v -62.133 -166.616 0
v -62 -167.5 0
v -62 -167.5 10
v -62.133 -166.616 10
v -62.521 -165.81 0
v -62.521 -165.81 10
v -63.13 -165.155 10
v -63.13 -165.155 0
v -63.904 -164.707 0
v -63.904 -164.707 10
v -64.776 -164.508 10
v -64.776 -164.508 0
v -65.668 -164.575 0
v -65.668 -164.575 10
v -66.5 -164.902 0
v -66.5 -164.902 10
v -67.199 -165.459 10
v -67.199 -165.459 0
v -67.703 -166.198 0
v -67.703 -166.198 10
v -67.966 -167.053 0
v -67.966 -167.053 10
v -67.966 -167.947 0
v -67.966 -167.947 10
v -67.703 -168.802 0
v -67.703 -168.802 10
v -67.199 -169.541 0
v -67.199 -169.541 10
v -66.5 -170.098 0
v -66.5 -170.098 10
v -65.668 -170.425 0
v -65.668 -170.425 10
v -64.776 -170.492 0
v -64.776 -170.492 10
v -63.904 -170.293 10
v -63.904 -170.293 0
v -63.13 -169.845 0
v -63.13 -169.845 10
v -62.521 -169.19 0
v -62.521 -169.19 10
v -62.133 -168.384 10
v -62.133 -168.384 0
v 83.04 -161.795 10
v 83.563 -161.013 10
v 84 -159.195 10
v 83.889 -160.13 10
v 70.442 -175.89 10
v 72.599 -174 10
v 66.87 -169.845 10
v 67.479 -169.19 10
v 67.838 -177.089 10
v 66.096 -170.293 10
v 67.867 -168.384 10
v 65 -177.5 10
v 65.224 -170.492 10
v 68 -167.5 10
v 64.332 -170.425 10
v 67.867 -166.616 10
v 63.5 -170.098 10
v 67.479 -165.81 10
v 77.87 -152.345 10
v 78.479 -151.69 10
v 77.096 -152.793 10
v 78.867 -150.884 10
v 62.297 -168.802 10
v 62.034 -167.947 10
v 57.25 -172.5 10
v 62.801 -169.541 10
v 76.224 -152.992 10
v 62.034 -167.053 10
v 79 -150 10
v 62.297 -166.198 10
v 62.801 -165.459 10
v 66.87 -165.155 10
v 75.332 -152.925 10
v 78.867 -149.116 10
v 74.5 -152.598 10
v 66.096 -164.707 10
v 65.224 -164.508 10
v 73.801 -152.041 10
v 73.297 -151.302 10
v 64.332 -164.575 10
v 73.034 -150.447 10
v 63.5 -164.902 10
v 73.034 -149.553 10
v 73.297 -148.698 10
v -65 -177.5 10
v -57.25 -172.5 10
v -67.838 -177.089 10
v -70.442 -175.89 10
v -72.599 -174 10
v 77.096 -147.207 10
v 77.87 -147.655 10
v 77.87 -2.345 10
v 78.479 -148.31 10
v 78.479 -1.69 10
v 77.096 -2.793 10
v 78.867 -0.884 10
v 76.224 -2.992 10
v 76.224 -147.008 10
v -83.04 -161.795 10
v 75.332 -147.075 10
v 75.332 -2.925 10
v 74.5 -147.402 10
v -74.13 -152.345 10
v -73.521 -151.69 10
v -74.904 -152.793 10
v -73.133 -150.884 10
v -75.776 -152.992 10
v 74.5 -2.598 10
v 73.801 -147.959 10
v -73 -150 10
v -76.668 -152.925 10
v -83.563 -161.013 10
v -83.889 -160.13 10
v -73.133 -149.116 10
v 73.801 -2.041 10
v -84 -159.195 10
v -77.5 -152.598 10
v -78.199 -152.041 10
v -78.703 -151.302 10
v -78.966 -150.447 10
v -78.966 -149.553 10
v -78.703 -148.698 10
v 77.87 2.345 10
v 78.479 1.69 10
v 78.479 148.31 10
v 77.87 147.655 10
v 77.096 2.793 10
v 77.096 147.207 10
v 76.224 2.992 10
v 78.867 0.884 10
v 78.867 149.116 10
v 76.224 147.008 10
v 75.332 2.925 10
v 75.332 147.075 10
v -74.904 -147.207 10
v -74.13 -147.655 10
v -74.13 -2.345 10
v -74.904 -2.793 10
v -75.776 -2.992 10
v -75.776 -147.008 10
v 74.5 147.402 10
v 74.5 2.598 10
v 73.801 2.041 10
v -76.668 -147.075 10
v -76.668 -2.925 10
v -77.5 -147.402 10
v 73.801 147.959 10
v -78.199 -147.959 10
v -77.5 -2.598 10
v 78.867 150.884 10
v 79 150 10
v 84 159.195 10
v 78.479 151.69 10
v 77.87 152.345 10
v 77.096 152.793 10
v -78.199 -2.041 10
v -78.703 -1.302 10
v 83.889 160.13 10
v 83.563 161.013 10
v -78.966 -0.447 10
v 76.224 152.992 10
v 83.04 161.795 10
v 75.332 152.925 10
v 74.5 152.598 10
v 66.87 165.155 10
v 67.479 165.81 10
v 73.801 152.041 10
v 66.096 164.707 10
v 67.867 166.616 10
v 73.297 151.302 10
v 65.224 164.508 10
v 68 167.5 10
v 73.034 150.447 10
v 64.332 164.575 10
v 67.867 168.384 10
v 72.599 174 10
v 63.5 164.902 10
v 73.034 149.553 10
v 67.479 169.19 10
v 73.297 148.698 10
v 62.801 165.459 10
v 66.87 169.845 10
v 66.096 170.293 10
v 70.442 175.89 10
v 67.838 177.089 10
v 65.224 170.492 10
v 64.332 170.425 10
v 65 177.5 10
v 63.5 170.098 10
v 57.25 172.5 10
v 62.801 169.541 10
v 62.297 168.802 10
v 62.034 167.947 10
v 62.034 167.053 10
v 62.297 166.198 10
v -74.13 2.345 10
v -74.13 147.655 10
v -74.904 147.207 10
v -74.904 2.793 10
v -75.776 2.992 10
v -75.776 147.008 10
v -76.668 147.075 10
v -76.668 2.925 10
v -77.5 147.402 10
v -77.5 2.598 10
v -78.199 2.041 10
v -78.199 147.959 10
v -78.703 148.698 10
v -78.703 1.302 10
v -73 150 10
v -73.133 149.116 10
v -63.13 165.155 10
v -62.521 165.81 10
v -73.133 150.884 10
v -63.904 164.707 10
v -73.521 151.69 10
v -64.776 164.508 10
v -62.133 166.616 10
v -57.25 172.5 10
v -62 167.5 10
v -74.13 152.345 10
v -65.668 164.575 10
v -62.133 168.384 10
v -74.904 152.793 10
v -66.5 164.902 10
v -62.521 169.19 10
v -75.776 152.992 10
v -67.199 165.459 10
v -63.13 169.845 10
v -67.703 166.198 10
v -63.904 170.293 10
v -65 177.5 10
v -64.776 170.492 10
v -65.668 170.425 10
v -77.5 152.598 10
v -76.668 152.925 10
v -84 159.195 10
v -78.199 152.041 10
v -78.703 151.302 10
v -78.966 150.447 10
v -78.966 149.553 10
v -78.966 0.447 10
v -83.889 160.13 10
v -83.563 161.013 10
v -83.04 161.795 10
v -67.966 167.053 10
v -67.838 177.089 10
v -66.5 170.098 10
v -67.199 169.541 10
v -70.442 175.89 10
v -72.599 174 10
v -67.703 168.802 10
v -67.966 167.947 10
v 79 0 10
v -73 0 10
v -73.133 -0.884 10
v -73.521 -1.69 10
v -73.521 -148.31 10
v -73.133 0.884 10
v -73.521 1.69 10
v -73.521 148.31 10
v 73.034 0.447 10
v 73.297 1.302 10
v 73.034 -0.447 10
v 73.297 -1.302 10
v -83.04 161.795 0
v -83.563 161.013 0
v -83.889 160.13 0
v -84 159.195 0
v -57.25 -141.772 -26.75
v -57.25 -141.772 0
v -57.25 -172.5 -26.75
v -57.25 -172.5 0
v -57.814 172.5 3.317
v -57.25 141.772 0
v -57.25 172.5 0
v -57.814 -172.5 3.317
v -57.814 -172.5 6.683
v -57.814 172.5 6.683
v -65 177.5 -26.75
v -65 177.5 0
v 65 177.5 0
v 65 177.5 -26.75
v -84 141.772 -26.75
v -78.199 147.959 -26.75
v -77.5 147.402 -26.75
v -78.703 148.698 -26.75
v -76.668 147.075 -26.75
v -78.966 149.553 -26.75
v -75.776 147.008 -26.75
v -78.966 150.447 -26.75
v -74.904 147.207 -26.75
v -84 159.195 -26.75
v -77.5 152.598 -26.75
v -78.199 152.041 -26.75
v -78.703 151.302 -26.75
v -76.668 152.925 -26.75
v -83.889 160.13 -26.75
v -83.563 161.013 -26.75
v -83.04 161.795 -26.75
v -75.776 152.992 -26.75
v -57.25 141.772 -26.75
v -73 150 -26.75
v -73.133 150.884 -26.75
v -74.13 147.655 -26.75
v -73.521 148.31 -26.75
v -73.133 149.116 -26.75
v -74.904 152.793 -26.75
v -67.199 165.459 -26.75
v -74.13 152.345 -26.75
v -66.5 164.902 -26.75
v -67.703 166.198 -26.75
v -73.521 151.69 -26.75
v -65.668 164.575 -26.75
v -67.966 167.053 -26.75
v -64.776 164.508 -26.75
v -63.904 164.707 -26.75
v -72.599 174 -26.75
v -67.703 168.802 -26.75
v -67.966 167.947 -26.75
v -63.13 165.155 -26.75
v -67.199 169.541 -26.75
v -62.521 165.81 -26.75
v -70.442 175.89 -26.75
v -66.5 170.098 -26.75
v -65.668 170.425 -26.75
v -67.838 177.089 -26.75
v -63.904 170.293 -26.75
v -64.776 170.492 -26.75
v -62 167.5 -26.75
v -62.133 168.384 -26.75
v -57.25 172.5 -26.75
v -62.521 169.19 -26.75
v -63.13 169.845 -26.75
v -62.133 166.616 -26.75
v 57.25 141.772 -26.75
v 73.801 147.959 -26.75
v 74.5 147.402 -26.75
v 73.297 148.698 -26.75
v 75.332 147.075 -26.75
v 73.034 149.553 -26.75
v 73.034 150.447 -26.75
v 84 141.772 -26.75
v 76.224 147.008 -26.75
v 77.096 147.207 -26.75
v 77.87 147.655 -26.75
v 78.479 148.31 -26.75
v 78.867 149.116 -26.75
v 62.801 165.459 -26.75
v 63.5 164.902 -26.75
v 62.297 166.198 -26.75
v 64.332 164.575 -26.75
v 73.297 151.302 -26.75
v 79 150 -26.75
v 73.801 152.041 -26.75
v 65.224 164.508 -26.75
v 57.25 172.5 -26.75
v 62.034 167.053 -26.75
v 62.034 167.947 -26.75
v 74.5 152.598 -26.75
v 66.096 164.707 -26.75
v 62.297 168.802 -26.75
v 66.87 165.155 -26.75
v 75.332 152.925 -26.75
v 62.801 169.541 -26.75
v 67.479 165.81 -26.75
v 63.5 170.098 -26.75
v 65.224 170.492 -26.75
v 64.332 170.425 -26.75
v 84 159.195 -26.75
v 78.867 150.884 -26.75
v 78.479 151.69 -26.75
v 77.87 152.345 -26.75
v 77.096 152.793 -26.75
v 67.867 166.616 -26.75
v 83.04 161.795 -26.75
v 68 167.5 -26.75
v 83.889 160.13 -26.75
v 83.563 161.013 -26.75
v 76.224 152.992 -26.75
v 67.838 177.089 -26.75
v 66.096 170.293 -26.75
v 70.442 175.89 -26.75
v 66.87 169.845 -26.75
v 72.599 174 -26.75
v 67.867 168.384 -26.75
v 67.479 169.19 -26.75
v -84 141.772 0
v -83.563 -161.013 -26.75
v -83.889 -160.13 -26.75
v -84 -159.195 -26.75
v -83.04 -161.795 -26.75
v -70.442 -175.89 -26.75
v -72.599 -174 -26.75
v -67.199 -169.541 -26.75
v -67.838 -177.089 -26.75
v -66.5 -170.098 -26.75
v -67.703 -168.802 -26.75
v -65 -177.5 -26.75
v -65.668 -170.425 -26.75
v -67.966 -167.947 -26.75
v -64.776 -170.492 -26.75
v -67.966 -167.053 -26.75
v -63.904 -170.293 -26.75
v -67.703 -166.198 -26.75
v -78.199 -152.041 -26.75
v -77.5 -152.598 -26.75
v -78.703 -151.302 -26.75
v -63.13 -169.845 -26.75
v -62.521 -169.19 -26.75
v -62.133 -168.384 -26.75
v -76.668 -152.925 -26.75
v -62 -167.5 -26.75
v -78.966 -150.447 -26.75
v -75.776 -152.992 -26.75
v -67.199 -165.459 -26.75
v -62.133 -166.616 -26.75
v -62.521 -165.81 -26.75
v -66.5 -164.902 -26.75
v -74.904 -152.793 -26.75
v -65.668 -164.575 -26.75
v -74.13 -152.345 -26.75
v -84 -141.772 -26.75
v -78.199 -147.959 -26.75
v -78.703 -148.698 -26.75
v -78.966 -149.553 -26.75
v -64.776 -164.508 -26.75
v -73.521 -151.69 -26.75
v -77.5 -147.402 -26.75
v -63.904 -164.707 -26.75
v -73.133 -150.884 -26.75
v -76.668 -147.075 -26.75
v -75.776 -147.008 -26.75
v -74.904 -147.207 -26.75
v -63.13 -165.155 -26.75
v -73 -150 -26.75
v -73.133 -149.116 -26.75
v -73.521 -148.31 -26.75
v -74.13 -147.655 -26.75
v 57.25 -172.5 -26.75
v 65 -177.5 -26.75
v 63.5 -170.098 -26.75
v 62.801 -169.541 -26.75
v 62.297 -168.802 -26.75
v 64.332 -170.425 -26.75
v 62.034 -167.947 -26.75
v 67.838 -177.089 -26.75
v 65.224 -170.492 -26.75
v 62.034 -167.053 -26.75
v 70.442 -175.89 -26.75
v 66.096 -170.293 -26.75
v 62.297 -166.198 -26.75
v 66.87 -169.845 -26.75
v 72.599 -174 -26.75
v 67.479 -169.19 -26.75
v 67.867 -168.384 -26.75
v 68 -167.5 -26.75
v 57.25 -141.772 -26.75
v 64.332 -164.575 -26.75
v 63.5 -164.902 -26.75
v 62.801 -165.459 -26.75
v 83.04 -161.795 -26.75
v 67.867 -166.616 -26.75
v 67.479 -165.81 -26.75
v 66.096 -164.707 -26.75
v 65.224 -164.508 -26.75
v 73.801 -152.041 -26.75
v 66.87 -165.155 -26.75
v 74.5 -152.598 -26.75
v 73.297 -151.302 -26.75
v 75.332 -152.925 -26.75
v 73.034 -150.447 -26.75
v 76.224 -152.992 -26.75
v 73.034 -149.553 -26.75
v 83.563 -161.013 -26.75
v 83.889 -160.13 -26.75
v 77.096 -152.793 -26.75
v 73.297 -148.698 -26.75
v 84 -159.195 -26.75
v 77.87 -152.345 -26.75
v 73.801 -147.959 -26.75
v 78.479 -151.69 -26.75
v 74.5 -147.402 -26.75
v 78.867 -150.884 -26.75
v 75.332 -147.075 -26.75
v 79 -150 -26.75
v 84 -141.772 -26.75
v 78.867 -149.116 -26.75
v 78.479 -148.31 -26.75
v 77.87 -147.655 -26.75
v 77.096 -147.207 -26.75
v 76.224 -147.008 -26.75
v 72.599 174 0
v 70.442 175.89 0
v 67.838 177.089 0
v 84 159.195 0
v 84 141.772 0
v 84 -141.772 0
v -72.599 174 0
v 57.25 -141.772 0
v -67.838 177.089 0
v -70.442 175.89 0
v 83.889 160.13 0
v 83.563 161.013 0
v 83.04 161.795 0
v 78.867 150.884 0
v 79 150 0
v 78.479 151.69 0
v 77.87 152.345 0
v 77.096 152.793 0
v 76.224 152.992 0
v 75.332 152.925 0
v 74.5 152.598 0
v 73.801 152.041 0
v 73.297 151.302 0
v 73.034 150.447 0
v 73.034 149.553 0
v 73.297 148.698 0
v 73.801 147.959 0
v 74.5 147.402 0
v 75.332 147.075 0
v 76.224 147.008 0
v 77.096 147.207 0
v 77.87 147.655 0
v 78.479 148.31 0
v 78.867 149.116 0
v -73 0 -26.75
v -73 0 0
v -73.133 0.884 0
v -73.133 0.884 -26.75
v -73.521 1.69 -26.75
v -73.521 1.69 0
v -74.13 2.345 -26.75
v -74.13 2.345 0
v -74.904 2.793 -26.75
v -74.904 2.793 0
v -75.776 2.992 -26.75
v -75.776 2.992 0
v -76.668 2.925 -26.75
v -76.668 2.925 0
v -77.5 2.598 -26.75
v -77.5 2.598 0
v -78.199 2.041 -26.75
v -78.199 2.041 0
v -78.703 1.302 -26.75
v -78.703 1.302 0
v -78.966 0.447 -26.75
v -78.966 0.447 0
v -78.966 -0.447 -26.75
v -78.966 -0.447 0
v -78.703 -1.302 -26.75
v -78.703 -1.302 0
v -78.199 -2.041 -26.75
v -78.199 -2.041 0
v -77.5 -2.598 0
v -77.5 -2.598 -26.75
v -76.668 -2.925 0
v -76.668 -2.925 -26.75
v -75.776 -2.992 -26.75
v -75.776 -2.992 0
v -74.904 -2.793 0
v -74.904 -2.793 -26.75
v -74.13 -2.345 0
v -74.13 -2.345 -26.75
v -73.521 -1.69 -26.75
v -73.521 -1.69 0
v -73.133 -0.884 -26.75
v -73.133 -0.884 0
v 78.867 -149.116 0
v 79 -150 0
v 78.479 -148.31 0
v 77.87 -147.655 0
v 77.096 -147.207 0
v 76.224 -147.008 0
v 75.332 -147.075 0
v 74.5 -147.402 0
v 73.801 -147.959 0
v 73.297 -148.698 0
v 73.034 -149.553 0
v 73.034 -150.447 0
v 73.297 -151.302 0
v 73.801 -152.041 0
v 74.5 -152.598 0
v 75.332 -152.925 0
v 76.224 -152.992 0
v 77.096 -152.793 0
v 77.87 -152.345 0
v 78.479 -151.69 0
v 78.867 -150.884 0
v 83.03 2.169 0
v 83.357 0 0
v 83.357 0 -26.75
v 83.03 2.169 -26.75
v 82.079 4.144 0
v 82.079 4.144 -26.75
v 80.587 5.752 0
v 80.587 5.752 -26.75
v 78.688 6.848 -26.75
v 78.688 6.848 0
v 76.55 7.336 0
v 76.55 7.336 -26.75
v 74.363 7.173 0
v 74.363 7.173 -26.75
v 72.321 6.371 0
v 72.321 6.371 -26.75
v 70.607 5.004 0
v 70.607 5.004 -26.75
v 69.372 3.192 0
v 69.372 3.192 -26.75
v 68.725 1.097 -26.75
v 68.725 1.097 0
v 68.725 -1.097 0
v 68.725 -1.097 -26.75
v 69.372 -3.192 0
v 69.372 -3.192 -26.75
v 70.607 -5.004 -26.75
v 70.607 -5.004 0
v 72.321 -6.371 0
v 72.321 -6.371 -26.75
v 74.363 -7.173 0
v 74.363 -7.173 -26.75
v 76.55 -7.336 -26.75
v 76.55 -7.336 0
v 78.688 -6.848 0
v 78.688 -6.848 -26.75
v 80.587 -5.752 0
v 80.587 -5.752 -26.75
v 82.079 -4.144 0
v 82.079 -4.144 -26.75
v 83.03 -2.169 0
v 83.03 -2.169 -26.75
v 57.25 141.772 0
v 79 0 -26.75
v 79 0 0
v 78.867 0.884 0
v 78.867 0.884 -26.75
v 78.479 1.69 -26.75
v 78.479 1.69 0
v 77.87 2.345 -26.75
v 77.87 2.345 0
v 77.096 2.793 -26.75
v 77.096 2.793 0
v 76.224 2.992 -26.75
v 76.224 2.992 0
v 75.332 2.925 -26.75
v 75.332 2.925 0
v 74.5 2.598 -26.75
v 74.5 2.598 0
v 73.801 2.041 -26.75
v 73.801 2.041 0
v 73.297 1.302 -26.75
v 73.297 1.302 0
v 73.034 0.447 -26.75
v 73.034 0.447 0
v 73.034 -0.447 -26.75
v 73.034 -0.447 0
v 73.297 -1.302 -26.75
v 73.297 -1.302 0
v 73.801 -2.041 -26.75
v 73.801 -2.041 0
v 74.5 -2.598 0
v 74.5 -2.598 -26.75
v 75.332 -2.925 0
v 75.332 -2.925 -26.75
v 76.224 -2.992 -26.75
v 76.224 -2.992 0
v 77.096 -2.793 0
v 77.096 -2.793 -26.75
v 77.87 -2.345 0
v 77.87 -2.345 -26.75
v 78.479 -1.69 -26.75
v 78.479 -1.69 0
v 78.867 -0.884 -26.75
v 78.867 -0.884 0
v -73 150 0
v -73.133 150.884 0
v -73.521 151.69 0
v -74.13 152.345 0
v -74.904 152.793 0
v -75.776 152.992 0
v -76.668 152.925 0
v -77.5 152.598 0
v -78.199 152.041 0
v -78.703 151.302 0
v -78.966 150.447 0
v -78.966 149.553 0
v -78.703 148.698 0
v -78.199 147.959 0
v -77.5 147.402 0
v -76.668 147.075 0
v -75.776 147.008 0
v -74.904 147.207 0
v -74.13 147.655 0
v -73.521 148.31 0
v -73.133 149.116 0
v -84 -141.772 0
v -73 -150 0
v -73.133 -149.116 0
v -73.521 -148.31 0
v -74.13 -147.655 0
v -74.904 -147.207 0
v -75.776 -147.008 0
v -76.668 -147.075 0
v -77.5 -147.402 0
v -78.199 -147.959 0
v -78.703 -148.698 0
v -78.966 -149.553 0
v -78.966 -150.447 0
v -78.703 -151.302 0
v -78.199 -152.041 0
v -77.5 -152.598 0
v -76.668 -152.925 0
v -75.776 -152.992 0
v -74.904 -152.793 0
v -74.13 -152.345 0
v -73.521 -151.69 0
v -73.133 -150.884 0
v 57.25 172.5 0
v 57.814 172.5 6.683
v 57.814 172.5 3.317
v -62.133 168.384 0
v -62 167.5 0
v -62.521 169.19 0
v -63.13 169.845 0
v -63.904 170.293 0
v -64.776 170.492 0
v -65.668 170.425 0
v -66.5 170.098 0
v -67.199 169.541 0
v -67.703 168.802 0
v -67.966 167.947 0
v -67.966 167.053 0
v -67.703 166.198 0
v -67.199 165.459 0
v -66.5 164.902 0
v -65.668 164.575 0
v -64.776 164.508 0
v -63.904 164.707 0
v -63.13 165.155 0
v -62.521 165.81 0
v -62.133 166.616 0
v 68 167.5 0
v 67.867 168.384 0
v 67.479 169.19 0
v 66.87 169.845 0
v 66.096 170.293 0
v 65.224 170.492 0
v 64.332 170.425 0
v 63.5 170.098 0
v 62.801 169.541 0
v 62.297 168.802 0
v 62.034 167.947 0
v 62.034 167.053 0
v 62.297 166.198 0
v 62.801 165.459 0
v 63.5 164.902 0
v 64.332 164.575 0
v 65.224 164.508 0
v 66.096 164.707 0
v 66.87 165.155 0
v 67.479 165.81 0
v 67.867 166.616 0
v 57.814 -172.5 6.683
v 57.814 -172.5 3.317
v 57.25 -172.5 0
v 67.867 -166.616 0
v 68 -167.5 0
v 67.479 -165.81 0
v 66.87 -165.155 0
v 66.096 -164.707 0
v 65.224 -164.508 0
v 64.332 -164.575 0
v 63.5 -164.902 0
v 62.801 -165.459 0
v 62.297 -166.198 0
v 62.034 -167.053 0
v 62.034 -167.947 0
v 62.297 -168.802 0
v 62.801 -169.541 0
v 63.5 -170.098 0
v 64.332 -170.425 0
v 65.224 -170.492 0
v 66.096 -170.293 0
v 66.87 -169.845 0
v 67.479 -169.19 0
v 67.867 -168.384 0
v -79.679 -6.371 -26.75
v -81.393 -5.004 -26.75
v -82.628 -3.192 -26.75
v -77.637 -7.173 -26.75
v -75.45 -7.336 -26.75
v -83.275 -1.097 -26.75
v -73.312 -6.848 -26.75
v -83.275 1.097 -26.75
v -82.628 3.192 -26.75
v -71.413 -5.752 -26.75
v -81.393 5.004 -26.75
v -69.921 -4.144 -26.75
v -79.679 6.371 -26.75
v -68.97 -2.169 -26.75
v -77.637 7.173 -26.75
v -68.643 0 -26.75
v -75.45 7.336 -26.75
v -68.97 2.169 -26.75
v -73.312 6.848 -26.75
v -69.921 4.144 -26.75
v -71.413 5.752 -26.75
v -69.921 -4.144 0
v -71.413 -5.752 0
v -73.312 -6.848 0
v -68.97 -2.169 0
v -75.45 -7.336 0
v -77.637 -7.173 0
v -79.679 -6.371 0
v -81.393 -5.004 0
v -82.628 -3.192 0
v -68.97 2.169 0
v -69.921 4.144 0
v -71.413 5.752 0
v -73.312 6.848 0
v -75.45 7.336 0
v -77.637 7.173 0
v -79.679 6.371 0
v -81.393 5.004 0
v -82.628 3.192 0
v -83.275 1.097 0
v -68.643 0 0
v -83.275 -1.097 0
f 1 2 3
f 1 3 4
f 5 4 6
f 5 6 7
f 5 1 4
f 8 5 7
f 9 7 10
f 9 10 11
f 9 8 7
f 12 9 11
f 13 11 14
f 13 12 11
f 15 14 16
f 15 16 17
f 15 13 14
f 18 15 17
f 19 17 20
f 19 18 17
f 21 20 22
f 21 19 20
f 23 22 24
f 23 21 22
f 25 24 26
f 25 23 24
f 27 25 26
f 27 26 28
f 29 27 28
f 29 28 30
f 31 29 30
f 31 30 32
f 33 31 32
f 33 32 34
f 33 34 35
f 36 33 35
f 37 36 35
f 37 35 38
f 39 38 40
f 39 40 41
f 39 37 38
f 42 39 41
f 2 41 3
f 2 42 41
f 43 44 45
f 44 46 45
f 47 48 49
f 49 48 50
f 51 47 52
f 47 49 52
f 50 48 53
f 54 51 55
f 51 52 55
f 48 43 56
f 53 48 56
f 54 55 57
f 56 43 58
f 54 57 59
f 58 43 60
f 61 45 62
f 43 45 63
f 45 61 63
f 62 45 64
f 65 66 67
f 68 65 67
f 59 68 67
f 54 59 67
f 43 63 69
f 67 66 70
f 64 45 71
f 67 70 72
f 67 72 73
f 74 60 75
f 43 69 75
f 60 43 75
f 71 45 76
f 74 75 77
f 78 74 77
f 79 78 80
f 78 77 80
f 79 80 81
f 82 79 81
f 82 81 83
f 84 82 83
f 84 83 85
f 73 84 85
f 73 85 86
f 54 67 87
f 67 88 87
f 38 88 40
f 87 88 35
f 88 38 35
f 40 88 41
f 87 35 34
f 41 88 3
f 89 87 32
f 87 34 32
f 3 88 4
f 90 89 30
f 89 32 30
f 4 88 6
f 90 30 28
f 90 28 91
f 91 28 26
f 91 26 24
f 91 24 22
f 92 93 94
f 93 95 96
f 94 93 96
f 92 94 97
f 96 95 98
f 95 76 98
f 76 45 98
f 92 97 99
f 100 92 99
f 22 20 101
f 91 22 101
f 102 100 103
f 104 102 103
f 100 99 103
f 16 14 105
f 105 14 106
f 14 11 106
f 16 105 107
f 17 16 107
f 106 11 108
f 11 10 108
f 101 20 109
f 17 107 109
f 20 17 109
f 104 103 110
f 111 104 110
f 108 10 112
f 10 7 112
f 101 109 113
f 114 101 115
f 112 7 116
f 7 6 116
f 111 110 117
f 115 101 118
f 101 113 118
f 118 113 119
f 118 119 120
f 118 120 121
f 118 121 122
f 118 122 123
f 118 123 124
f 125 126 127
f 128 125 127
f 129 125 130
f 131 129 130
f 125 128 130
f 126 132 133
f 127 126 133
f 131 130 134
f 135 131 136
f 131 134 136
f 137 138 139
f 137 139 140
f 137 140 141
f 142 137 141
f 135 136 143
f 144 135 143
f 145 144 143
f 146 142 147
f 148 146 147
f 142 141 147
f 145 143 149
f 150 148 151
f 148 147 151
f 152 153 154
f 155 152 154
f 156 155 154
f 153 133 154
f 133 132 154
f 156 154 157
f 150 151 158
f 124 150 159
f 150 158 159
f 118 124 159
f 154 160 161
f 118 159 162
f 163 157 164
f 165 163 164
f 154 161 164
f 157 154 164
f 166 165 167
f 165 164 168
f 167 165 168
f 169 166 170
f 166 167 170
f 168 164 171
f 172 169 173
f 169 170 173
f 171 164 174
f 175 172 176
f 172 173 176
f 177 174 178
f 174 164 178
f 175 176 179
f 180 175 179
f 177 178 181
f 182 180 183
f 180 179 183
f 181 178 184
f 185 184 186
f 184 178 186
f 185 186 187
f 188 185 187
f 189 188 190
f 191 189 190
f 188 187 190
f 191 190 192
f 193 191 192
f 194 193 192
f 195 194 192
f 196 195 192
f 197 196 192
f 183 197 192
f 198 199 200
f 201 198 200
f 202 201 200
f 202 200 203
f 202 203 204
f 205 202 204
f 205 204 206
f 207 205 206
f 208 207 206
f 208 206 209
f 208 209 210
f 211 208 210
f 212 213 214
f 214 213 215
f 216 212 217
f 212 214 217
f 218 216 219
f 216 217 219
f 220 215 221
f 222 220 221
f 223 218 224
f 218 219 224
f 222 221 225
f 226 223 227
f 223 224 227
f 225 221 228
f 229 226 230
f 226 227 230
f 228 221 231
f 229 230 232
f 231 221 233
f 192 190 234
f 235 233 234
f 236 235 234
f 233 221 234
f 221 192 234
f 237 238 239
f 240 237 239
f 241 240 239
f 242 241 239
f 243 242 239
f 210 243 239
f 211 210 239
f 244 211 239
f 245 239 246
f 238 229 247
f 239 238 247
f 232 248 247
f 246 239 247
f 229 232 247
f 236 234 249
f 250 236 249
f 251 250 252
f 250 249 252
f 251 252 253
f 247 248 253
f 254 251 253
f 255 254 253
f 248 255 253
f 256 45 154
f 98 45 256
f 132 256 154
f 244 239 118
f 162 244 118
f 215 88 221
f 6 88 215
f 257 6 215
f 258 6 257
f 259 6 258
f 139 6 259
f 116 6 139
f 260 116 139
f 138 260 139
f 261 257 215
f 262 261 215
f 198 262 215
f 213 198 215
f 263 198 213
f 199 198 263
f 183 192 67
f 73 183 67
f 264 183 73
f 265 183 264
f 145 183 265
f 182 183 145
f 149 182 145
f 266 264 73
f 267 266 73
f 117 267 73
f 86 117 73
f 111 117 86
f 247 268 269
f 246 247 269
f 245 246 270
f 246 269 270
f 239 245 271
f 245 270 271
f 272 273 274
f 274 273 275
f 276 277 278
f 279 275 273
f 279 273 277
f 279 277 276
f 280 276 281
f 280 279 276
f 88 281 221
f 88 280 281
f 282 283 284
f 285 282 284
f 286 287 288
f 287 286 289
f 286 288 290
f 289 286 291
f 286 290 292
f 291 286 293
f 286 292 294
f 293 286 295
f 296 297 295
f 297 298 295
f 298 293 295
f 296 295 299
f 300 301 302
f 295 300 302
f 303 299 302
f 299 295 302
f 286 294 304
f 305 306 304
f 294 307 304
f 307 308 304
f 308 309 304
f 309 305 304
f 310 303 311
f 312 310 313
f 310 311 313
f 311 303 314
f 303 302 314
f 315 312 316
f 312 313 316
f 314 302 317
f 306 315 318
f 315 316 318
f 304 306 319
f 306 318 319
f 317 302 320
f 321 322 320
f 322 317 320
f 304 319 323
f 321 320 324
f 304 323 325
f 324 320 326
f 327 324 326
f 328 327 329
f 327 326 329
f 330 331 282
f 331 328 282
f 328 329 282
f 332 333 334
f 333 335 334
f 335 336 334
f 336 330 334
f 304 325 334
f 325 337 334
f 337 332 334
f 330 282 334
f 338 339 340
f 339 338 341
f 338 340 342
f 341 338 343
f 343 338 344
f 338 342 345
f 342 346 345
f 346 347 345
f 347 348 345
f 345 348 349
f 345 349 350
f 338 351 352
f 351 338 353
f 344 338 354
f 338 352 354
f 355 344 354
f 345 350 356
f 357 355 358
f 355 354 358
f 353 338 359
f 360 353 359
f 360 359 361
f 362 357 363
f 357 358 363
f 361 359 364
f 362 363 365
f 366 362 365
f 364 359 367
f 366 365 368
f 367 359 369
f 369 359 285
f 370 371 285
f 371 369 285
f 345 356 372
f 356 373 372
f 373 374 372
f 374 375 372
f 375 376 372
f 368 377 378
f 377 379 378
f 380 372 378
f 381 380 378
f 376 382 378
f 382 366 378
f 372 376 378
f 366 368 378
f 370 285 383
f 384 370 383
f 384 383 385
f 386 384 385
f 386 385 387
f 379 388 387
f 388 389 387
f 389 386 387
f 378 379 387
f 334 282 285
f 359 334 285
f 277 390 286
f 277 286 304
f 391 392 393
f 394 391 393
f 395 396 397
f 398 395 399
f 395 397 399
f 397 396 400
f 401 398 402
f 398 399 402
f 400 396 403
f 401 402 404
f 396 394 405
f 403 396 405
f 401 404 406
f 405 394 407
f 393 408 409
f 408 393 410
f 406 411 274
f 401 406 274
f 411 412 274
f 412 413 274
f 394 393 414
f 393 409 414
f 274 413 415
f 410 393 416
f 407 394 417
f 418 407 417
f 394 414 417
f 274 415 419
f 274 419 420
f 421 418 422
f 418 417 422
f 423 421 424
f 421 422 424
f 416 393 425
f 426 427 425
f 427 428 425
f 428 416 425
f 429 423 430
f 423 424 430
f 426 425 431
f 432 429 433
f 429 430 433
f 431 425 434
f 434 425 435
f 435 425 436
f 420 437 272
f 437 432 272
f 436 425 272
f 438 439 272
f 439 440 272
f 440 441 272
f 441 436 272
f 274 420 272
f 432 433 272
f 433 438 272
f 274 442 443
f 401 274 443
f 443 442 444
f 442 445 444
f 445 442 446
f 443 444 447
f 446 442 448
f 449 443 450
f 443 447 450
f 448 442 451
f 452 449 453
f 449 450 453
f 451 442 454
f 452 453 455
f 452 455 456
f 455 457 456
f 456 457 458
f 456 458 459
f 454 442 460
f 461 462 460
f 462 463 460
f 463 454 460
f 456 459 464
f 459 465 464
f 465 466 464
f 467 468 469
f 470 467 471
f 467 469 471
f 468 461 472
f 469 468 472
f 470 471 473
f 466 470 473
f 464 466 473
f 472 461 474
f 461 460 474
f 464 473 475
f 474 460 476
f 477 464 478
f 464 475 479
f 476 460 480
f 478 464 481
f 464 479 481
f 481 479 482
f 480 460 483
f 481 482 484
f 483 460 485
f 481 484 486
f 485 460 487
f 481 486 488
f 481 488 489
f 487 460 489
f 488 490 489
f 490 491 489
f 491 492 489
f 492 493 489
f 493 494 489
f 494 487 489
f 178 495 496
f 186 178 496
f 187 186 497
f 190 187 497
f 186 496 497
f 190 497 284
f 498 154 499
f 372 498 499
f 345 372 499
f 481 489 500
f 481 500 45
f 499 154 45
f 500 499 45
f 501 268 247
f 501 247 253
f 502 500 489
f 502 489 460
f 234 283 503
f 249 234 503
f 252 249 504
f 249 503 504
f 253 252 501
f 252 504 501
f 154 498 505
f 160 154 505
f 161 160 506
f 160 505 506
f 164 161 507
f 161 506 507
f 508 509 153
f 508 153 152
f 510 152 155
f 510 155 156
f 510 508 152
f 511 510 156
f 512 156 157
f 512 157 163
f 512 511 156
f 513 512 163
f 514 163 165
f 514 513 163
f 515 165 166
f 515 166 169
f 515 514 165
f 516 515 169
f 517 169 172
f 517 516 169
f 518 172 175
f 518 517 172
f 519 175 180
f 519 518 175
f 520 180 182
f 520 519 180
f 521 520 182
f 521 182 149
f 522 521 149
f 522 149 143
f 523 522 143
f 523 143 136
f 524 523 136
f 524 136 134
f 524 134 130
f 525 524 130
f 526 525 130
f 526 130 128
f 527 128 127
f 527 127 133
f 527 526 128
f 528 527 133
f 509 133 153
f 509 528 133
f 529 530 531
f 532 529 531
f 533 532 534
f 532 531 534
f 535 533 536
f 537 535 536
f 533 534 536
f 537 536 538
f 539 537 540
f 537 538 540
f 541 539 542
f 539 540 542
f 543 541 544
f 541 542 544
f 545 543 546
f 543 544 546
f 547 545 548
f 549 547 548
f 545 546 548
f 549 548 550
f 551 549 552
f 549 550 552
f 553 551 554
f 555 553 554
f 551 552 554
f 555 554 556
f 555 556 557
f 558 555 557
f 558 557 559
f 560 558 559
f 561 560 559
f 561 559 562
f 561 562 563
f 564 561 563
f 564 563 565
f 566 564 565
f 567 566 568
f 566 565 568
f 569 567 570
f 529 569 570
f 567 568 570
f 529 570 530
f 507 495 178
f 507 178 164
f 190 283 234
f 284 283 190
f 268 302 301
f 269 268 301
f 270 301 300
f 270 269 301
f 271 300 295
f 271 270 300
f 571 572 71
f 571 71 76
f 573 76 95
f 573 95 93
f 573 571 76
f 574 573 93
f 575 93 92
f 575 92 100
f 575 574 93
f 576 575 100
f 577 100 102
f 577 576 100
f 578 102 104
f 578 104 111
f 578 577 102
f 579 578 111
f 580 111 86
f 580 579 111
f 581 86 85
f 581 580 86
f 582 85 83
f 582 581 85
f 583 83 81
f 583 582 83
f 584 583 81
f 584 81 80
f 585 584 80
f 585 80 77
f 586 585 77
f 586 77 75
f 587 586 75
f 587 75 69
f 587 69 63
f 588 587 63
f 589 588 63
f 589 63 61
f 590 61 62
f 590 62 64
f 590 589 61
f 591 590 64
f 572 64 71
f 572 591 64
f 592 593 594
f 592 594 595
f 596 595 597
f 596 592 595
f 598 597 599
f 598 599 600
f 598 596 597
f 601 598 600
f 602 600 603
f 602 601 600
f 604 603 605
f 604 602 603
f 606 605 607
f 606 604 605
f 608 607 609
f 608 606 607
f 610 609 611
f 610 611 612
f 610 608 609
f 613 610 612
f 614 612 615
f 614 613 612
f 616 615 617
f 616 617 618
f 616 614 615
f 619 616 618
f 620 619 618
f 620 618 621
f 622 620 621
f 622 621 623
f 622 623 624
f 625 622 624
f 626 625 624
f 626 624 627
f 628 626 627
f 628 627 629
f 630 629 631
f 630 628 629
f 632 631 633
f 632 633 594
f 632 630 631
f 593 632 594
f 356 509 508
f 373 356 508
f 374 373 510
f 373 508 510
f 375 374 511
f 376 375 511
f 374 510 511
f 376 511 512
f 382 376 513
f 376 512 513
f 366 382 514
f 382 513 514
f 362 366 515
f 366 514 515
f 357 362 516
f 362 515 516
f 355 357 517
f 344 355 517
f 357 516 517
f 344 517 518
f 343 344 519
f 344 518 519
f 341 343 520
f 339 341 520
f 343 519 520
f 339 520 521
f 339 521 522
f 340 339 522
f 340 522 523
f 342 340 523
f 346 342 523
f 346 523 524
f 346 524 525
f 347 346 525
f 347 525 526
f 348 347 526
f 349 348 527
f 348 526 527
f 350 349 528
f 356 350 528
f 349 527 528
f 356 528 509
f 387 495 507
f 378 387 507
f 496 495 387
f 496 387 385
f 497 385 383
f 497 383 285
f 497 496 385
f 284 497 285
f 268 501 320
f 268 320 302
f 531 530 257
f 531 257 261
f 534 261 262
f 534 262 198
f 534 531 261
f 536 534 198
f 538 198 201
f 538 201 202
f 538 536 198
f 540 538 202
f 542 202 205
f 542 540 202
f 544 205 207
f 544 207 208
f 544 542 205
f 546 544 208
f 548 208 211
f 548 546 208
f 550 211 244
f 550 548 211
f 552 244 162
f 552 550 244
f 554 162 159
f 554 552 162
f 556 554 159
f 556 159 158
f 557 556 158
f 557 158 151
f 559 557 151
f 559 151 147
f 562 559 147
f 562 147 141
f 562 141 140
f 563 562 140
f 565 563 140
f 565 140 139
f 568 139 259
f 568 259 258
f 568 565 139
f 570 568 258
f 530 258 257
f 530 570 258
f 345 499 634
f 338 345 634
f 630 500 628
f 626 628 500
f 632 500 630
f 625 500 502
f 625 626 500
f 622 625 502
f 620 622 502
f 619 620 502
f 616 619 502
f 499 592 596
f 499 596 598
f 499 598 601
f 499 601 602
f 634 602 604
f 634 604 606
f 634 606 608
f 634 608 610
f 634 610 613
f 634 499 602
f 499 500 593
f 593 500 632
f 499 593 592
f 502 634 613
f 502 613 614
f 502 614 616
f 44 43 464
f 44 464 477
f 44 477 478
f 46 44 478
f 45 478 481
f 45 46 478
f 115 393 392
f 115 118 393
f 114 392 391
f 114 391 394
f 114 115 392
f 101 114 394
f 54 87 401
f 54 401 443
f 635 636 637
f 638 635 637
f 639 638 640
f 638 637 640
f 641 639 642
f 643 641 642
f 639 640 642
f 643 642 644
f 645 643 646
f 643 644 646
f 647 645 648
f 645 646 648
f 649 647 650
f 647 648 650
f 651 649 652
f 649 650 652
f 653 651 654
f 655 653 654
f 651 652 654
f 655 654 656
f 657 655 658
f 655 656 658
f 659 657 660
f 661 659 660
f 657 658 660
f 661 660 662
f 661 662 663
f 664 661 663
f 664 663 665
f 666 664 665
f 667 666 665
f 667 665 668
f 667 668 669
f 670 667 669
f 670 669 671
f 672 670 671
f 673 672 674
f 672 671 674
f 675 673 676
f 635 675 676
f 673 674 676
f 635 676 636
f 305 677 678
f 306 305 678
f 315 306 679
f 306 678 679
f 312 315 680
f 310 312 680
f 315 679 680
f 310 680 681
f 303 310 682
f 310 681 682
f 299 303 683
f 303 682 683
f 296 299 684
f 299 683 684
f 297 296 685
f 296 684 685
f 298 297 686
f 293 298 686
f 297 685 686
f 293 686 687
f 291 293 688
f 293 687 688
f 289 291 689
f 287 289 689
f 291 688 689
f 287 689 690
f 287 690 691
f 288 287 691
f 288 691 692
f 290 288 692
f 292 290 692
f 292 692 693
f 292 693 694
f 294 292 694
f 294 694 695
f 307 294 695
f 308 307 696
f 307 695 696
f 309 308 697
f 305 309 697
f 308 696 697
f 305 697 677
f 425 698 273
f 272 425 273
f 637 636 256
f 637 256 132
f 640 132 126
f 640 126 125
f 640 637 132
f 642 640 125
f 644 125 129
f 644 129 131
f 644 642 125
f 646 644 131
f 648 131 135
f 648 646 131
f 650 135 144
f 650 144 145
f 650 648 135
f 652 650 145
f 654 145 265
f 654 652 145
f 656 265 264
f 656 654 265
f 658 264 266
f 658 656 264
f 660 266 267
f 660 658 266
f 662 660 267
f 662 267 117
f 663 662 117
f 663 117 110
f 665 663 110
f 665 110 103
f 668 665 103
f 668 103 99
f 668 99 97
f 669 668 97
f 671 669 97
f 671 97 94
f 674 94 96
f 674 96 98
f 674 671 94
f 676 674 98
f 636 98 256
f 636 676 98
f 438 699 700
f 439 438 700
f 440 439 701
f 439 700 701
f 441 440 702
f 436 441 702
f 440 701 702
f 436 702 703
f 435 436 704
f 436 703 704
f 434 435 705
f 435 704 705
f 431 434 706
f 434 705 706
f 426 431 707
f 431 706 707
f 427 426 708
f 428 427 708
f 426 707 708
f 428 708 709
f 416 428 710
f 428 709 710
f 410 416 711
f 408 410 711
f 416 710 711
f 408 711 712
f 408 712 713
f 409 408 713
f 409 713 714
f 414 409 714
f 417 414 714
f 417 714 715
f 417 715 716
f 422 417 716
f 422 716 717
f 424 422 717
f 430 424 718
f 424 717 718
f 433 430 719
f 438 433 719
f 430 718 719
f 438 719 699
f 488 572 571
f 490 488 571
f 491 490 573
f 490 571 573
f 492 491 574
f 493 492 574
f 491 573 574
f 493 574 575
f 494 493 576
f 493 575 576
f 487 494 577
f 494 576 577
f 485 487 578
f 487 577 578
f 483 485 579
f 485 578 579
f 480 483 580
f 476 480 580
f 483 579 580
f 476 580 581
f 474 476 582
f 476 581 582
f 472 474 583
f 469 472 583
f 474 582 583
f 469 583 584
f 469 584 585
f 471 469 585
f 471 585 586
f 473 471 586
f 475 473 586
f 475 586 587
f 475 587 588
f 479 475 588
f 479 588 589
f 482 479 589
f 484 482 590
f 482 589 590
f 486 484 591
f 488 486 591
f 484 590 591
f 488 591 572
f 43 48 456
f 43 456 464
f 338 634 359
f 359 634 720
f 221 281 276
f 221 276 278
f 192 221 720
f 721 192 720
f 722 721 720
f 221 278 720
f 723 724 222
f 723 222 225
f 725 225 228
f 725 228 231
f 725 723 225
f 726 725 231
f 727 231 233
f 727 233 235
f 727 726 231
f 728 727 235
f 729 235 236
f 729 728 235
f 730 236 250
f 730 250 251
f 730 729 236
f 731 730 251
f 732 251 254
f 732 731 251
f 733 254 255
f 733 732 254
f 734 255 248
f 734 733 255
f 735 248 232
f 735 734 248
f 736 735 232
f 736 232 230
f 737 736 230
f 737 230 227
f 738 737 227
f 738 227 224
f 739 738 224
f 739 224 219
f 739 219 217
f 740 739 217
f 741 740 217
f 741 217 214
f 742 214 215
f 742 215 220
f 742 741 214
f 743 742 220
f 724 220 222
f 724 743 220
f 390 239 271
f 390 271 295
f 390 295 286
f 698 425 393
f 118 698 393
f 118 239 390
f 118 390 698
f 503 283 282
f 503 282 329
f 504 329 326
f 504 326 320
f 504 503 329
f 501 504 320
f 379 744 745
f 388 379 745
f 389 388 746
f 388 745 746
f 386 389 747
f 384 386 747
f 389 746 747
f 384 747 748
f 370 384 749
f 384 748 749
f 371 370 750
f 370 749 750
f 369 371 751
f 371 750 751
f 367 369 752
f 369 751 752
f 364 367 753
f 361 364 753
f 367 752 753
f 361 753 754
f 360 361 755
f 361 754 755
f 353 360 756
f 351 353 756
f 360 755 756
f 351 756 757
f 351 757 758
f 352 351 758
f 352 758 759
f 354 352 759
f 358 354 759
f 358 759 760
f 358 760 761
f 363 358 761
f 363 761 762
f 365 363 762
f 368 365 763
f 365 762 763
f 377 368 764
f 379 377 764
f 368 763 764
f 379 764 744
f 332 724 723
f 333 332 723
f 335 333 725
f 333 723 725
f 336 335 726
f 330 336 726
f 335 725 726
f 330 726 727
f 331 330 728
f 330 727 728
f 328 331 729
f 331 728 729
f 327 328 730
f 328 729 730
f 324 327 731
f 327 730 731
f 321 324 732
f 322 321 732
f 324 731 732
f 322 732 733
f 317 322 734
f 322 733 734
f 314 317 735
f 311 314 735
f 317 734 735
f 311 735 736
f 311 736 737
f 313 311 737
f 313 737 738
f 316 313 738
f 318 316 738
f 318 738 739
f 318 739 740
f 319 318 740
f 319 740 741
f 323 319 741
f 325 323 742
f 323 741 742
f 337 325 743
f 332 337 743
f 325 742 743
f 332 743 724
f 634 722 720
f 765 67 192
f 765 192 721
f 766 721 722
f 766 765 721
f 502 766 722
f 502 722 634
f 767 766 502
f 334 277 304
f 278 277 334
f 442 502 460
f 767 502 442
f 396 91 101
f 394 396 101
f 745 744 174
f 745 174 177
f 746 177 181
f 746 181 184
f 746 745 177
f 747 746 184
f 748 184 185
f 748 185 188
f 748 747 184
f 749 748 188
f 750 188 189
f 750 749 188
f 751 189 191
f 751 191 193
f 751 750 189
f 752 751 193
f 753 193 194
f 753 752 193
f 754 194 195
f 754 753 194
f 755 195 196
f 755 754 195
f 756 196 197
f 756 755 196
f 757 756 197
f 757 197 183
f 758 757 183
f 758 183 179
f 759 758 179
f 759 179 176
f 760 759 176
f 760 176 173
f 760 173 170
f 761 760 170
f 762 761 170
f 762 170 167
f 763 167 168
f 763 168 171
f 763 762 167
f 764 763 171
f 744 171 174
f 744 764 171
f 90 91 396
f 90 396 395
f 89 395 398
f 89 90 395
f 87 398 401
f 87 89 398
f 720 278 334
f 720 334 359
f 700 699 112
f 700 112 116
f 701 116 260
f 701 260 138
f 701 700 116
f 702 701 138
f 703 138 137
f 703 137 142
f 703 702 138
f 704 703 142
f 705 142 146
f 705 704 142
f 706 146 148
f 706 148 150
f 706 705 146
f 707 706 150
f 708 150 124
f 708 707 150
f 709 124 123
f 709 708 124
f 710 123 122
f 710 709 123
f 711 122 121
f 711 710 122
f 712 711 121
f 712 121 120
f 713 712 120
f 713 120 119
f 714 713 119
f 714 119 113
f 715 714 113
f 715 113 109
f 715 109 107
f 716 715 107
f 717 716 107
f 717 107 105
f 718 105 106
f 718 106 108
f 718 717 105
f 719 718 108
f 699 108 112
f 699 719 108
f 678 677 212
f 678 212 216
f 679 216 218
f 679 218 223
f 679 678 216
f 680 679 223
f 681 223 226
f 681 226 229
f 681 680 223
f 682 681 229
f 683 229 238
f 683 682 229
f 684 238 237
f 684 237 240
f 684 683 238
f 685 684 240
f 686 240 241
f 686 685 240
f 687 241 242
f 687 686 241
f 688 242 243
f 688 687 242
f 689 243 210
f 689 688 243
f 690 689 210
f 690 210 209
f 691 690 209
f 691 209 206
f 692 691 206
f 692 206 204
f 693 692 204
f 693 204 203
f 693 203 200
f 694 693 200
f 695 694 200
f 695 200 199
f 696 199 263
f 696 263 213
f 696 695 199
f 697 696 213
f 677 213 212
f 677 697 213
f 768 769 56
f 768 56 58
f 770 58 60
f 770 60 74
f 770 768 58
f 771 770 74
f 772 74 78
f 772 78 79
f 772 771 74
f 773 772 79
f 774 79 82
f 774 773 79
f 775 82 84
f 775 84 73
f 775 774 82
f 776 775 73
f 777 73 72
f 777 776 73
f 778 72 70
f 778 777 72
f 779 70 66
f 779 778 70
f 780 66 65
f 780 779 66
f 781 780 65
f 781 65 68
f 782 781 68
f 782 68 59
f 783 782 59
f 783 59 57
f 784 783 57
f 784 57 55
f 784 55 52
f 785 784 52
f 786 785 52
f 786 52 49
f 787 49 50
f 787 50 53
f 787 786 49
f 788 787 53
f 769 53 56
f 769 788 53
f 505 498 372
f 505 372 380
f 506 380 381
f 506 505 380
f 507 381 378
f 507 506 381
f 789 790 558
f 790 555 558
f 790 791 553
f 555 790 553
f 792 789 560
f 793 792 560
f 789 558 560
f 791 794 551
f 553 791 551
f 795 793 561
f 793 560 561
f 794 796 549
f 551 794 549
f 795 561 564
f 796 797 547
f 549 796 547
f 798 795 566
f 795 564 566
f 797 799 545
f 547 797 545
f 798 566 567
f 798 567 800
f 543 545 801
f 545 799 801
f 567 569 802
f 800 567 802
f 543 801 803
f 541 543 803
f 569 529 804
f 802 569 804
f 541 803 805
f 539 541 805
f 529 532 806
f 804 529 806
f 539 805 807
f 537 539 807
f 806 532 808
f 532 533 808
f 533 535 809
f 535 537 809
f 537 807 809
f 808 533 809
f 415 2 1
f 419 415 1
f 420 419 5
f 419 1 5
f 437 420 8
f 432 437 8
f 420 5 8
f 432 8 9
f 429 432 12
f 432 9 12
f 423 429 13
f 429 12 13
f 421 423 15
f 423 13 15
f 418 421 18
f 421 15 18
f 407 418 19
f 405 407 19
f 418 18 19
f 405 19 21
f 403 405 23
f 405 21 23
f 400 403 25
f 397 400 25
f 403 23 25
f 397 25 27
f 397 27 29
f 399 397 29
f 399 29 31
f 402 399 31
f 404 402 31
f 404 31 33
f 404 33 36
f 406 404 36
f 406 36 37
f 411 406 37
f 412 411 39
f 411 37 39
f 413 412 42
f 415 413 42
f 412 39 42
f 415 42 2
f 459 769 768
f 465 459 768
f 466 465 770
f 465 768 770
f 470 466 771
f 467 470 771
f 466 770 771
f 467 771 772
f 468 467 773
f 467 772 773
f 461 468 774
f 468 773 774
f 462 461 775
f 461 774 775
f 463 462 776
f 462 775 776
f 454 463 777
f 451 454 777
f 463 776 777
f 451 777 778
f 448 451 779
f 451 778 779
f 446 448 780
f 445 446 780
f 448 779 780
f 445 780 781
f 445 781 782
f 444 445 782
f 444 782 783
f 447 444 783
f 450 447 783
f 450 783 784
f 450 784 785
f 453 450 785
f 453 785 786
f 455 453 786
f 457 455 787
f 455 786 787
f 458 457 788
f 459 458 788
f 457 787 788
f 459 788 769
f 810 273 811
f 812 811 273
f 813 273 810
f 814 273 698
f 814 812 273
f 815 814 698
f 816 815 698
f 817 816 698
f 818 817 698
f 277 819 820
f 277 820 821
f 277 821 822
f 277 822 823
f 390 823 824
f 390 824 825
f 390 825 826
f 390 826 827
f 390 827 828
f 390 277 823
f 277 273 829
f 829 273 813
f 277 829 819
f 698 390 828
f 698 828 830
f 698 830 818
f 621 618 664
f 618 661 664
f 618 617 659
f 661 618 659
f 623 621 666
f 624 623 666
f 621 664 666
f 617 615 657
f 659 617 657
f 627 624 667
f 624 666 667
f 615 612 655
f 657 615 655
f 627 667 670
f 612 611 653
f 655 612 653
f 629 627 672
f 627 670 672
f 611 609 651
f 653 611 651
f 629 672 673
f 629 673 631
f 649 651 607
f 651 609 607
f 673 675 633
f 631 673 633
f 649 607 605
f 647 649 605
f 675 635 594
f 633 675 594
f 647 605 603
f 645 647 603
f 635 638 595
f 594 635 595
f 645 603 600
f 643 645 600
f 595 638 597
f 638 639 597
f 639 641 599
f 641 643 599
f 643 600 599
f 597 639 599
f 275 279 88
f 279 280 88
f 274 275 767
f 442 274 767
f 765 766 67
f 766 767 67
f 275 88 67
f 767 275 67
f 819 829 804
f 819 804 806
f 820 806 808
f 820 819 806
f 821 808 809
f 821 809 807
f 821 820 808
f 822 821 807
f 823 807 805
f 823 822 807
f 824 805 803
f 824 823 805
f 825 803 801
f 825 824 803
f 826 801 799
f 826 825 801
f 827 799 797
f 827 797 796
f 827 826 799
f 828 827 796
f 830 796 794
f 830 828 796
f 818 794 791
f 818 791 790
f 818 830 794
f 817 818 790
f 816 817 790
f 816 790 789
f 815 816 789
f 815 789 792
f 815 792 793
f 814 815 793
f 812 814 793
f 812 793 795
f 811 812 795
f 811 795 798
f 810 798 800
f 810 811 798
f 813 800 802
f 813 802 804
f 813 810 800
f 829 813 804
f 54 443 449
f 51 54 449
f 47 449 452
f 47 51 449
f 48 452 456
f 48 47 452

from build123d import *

# Parameters (mm, degrees)
SKETCH066_R     = 7.357041
SKETCH066_R_2   = 3
EXTRUDE_DEPTH   = 26.75
SKETCH065_R     = 3
SKETCH065_W     = 114.5
SKETCH065_H     = 345
PAD035_DEPTH    = 10
POCKET035_DEPTH = 345


with BuildPart() as body082:
    # Sketch066 → Extrude (new body)
    with BuildSketch(Plane.XY):
        with Locations((-76, 0)):
            Circle(SKETCH066_R)
        with Locations((-76, 0)):
            Circle(SKETCH066_R_2, mode=Mode.SUBTRACT)
        with Locations((76, 0)):
            Circle(SKETCH066_R)
        with Locations((76, 0)):
            Circle(SKETCH066_R_2, mode=Mode.SUBTRACT)
        with BuildLine():
            ThreePointArc((-83.039601, 161.795278), (-83.752226, 160.581048), (-84, 159.195119))
            Line((-84, 141.77214), (-84, 159.195119))
            Line((-84, 141.77214), (-57.25, 141.77214))
            Line((-57.25, 141.77214), (-57.25, 172.5))
            Line((-57.25, 172.5), (57.25, 172.5))
            Line((57.25, 141.77214), (57.25, 172.5))
            Line((84, 141.77214), (57.25, 141.77214))
            Line((84, 141.77214), (84, 159.195119))
            ThreePointArc((84, 159.195119), (83.752226, 160.581048), (83.039601, 161.795278))
            Line((72.599002, 174.000398), (83.039601, 161.795278))
            ThreePointArc((72.599002, 174.000398), (69.183062, 176.583061), (65, 177.5))
            Line((-65, 177.5), (65, 177.5))
            ThreePointArc((-65, 177.5), (-69.183062, 176.583061), (-72.599002, 174.000398))
            Line((-72.599002, 174.000398), (-83.039601, 161.795278))
        make_face()
        with Locations((-65, 167.5)):
            Circle(SKETCH066_R_2, mode=Mode.SUBTRACT)
        with Locations((-76, 150)):
            Circle(SKETCH066_R_2, mode=Mode.SUBTRACT)
        with Locations((65, 167.5)):
            Circle(SKETCH066_R_2, mode=Mode.SUBTRACT)
        with Locations((76, 150)):
            Circle(SKETCH066_R_2, mode=Mode.SUBTRACT)
        with BuildLine():
            ThreePointArc((-84, -159.195119), (-83.752226, -160.581048), (-83.039601, -161.795278))
            Line((-72.599002, -174.000398), (-83.039601, -161.795278))
            ThreePointArc((-72.599002, -174.000398), (-69.183062, -176.583061), (-65, -177.5))
            Line((-65, -177.5), (65, -177.5))
            ThreePointArc((65, -177.5), (69.183062, -176.583061), (72.599002, -174.000398))
            Line((72.599002, -174.000398), (83.039601, -161.795278))
            ThreePointArc((83.039601, -161.795278), (83.752226, -160.581048), (84, -159.195119))
            Line((84, -141.77214), (84, -159.195119))
            Line((84, -141.77214), (57.25, -141.77214))
            Line((57.25, -141.77214), (57.25, -172.5))
            Line((-57.25, -172.5), (57.25, -172.5))
            Line((-57.25, -141.77214), (-57.25, -172.5))
            Line((-84, -141.77214), (-57.25, -141.77214))
            Line((-84, -141.77214), (-84, -159.195119))
        make_face()
        with Locations((-65, -167.5)):
            Circle(SKETCH066_R_2, mode=Mode.SUBTRACT)
        with Locations((-76, -150)):
            Circle(SKETCH066_R_2, mode=Mode.SUBTRACT)
        with Locations((65, -167.5)):
            Circle(SKETCH066_R_2, mode=Mode.SUBTRACT)
        with Locations((76, -150)):
            Circle(SKETCH066_R_2, mode=Mode.SUBTRACT)
    extrude(amount=-EXTRUDE_DEPTH)


with BuildPart() as body081:
    # Sketch065 → Pad035 (new body)
    with BuildSketch(Plane.XY):
        with BuildLine():
            Line((84, -33.872292), (84, 33.872292))
            Line((84, 159.195119), (84, 33.872292))
            ThreePointArc((84, 159.195119), (83.752226, 160.581048), (83.039601, 161.795278))
            Line((72.599002, 174.000398), (83.039601, 161.795278))
            ThreePointArc((72.599002, 174.000398), (69.183062, 176.583061), (65, 177.5))
            Line((-65, 177.5), (65, 177.5))
            ThreePointArc((-65, 177.5), (-69.183062, 176.583061), (-72.599002, 174.000398))
            Line((-83.039601, 161.795278), (-72.599002, 174.000398))
            ThreePointArc((-83.039601, 161.795278), (-83.752226, 160.581048), (-84, 159.195119))
            Line((-84, 33.872292), (-84, 159.195119))
            Line((-84, 33.872292), (-84, -33.872292))
            Line((-84, -33.872292), (-84, -159.195119))
            ThreePointArc((-84, -159.195119), (-83.752226, -160.581048), (-83.039601, -161.795278))
            Line((-83.039601, -161.795278), (-72.599002, -174.000398))
            ThreePointArc((-72.599002, -174.000398), (-69.183062, -176.583061), (-65, -177.5))
            Line((-65, -177.5), (65, -177.5))
            ThreePointArc((65, -177.5), (69.183062, -176.583061), (72.599002, -174.000398))
            Line((72.599002, -174.000398), (83.039601, -161.795278))
            ThreePointArc((83.039601, -161.795278), (83.752226, -160.581048), (84, -159.195119))
            Line((84, -159.195119), (84, -33.872292))
        make_face()
        with Locations((-76, 150)):
            Circle(SKETCH065_R, mode=Mode.SUBTRACT)
        with Locations((76, 150)):
            Circle(SKETCH065_R, mode=Mode.SUBTRACT)
        with Locations((-76, -150)):
            Circle(SKETCH065_R, mode=Mode.SUBTRACT)
        with Locations((76, -150)):
            Circle(SKETCH065_R, mode=Mode.SUBTRACT)
        with Locations((76, 0)):
            Circle(SKETCH065_R, mode=Mode.SUBTRACT)
        with Locations((-76, 0)):
            Circle(SKETCH065_R, mode=Mode.SUBTRACT)
        with Locations((-65, 167.5)):
            Circle(SKETCH065_R, mode=Mode.SUBTRACT)
        with Locations((65, 167.5)):
            Circle(SKETCH065_R, mode=Mode.SUBTRACT)
        with Locations((-65, -167.5)):
            Circle(SKETCH065_R, mode=Mode.SUBTRACT)
        with Locations((65, -167.5)):
            Circle(SKETCH065_R, mode=Mode.SUBTRACT)
        Rectangle(SKETCH065_W, SKETCH065_H, mode=Mode.SUBTRACT)
    extrude(amount=PAD035_DEPTH)

    # Sketch068 (on Face21 of Pad035) → Pocket035 (cut)
    with BuildSketch(Plane(origin=(0, -172.5, 0), x_dir=(-1, 0, 0), z_dir=(0, 1, 0))):
        with BuildLine():
            ThreePointArc((-57.25, 10), (-57.885083, 5), (-57.25, 0))
            Line((-57.25, 10), (-57.25, 0))
        make_face()
        with BuildLine():
            ThreePointArc((57.25, 0), (57.885083, 5), (57.25, 10))
            Line((57.25, 10), (57.25, 0))
        make_face()
    extrude(amount=POCKET035_DEPTH, mode=Mode.SUBTRACT)

    # Boolean006: union Body082
    add(body082.part)


solid = body081.part
